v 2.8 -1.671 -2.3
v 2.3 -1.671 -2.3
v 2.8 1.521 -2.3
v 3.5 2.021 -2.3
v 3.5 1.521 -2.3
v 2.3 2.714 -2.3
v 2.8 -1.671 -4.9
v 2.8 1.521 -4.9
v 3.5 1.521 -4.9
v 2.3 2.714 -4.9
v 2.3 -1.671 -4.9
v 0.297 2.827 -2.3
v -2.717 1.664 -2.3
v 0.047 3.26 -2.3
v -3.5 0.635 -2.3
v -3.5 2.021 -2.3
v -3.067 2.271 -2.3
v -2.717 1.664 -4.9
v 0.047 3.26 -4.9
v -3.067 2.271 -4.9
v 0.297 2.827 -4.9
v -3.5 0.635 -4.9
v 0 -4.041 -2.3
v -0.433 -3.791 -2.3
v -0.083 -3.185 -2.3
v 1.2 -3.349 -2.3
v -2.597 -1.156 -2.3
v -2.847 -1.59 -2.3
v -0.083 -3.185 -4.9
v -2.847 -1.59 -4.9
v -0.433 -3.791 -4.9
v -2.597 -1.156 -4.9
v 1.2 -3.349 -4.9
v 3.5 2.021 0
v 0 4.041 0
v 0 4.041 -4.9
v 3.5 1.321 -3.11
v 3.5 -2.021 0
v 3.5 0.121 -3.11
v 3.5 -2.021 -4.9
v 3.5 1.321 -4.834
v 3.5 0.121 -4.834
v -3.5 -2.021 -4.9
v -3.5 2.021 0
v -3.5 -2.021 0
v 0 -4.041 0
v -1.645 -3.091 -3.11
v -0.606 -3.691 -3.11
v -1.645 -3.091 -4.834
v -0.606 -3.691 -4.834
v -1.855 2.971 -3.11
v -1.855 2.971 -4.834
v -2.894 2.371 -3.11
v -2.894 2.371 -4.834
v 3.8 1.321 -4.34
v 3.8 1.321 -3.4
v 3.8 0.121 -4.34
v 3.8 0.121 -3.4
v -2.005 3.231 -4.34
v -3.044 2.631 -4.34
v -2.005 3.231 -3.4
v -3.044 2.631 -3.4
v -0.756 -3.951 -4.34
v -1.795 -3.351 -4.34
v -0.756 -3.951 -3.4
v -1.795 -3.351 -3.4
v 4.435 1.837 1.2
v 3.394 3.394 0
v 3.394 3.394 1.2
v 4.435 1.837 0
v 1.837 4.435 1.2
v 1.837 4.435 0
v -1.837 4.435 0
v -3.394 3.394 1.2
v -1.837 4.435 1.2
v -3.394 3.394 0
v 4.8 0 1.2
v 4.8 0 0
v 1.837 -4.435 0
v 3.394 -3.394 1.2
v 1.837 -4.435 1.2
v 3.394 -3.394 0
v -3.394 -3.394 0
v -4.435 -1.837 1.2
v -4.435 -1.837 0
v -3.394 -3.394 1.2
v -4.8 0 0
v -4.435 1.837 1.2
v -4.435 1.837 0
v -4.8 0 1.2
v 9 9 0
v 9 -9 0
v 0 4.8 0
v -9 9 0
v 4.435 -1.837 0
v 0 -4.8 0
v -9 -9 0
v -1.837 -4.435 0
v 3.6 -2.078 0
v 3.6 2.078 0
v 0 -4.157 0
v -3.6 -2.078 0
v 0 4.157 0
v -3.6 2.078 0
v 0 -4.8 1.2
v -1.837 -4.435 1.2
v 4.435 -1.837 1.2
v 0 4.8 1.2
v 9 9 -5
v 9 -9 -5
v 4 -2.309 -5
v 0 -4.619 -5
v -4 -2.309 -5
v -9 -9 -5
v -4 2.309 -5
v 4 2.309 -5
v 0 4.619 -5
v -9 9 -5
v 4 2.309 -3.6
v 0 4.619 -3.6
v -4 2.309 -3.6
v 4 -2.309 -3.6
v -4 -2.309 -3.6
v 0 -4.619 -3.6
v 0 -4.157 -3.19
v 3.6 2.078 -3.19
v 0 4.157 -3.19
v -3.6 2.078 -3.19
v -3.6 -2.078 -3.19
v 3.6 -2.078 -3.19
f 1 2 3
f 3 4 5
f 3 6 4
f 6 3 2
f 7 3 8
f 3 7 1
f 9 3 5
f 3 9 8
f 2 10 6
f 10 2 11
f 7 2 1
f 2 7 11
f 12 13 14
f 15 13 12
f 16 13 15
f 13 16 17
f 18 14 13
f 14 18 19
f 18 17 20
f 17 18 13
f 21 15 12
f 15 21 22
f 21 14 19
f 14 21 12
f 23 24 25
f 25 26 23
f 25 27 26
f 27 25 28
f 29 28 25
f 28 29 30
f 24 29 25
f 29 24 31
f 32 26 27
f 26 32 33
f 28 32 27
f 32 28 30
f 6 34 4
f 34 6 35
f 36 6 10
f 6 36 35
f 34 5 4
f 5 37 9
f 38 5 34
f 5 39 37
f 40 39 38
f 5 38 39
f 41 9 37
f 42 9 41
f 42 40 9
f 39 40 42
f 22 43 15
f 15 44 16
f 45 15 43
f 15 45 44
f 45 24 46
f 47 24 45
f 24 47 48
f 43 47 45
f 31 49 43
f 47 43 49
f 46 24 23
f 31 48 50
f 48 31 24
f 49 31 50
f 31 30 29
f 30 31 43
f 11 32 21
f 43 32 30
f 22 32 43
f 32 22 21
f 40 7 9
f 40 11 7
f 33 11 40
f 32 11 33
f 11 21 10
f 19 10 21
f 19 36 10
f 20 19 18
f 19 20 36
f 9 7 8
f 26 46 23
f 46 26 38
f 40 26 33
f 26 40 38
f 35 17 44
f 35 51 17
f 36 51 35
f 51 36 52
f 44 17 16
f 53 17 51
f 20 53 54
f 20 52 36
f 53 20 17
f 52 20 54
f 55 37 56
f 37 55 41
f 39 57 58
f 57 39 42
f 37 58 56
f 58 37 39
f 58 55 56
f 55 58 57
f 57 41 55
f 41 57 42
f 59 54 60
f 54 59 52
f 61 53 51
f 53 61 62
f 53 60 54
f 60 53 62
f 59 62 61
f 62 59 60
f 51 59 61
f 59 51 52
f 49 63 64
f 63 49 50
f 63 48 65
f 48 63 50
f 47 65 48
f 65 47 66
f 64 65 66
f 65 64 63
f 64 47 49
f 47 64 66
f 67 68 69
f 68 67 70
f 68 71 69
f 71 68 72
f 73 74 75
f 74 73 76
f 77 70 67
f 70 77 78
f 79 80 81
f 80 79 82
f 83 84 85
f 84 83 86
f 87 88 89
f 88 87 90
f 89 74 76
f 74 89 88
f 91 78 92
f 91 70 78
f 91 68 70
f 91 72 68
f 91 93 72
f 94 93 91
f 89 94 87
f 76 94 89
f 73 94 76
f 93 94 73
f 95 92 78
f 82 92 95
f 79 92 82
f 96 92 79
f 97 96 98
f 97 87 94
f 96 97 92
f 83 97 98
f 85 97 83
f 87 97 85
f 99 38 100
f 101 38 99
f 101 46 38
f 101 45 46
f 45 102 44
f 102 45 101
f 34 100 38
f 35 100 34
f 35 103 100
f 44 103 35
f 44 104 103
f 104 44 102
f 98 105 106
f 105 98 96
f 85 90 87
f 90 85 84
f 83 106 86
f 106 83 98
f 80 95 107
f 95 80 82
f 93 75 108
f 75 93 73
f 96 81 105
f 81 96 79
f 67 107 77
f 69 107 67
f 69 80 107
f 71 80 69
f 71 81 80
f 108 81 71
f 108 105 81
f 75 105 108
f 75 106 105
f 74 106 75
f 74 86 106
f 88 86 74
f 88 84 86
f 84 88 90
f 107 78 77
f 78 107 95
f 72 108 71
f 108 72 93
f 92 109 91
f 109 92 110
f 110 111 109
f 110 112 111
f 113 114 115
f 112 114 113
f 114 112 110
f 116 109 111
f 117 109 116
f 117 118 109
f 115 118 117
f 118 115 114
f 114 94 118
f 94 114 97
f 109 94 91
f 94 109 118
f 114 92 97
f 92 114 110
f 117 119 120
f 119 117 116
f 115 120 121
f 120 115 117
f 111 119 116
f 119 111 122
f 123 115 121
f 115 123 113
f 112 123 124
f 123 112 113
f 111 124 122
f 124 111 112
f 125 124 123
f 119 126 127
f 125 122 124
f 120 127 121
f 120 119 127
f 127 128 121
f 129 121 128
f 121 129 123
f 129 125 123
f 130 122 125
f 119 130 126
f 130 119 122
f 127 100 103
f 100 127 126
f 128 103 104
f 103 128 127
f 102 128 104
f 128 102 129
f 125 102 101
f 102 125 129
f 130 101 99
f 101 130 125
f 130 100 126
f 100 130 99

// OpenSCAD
// file: _review.scad
// Shared by the review protos: the colours of a before/after pair.  The part in a neutral grey-blue, the
// geometry a proposal changes in the accent, the parts it mates with in a translucent grey.
NEUTRAL = "#b9c6d6";
ACCENT = "#ff7a1a";
MATE = "#6f7782";
MATE_A = 0.45;
PCB = "#2f6f4f";
module part() color(NEUTRAL) children();
module changed() color(ACCENT) children();
module mate(a = MATE_A) color(MATE, a) children();
// main file
// Review proto (not a part): a peg's plug (hexgrid.scad peg_plug) in its hole, the plate cut away round it
// (grey, translucent), seen from below.  Today: spring skins 0.7 thick over SKIN_H 2.6, their slot stopping
// 0.35 mm short of the flat's end: a 3.0 mm cantilever, 2.3 % for the nub's 0.2 mm, allowed 1.5 % for
// repeated use.  Proposed (accent: the skins): SKIN_H 3.4, the slot run to the flat's end: 3.7 mm, 1.5 %.
// docs/printed-parts-review.md › Pegs.
//
//   openscad -D 'VIEW="today"' -o peg_skin_today.png mechanical/review/proto/peg_skin.scad
include <_review.scad>
VIEW = "today";
PLATE_T = 5; HEX_AF = 7.2; HEX_U = 0.4; HEX_CLEAR = 0.1; HEX_UNDER_H = 1.4;
PLUG_AF = HEX_AF - 2 * HEX_CLEAR; PLUG_L = PLUG_AF / sqrt(3);
SKIN = 0.7; SKIN_SLOT = 0.5; NUB = 0.3; EPS = 0.01;
function hexpts(af) = [for (k = [0:5]) let (a = 90 + 60 * k) (af / sqrt(3)) * [cos(a), sin(a)]];
module hex2d(af) polygon(hexpts(af));
Z0 = -PLATE_T + 0.1;
ZL = -PLATE_T + HEX_UNDER_H; ZA = ZL + HEX_U + HEX_CLEAR - NUB;

module skin_cuts(skin_h, to_end) for (k = [0, 2, 4]) rotate(60 * k) translate([0, 0, Z0 - 1]) linear_extrude(skin_h + 1) {
    translate([PLUG_AF / 2 - SKIN - SKIN_SLOT, -PLUG_L / 2 + (to_end ? -0.5 : 0.35)]) square([SKIN_SLOT, PLUG_L + (to_end ? 0.5 : 0)]);
    translate([PLUG_AF / 2 - SKIN - SKIN_SLOT, PLUG_L / 2 - SKIN_SLOT]) square([SKIN + SKIN_SLOT + 1, 2]);
}
module nub(k) rotate(60 * k) translate([PLUG_AF / 2, PLUG_L / 2 - SKIN_SLOT - 0.8, 0]) rotate([90, 0, 0]) linear_extrude(1.2, center = true)
    polygon([[-EPS, Z0 + 0.05], [NUB, Z0 + 0.05 + NUB * 1.7], [NUB, ZA], [-EPS, ZA + NUB]]);
module body(skin_h, to_end) difference() { translate([0, 0, Z0]) linear_extrude(PLATE_T - 0.1 + EPS) hex2d(PLUG_AF); skin_cuts(skin_h, to_end); }
module flange() linear_extrude(1.2) circle(d = 9.6);
// a skin: the 0.7 wall left outside the slot, from the slot's start to the cross-slot, over the spring height
module skin_box(k, skin_h, to_end) rotate(60 * k) translate([PLUG_AF / 2 - SKIN, -PLUG_L / 2 + (to_end ? -0.5 : 0.35), Z0 - 0.5]) cube([SKIN + 0.5, PLUG_L - SKIN_SLOT - (to_end ? -0.5 : 0.35), skin_h + 0.5]);
module skin_piece(k, skin_h, to_end) rotate(60 * k) translate([PLUG_AF / 2 - SKIN, -PLUG_L / 2 + (to_end ? -0.5 : 0.35), Z0]) cube([SKIN, PLUG_L - SKIN_SLOT - (to_end ? -0.5 : 0.35), skin_h]);
// the plate round the hole: waist, undercut, 45° ledge (lib/hexgrid.scad hex_hole), 18 mm of plate
module plate_ring() mate(0.35) translate([0, 0, -PLATE_T]) difference() {
    translate([-9, -9, 0]) cube([18, 18, PLATE_T]);
    translate([0, 0, -1]) linear_extrude(HEX_UNDER_H + 1) hex2d(HEX_AF + 2 * HEX_U);
    hull() { translate([0, 0, HEX_UNDER_H - EPS]) linear_extrude(EPS) hex2d(HEX_AF + 2 * HEX_U); translate([0, 0, HEX_UNDER_H + HEX_U]) linear_extrude(EPS) hex2d(HEX_AF); }
    translate([0, 0, HEX_UNDER_H]) linear_extrude(PLATE_T) hex2d(HEX_AF);
}

if (VIEW == "today") { part() { body(2.6, false); for (k = [0, 2, 4]) nub(k); flange(); } plate_ring(); }
else {
    part() { difference() { body(3.4, true); for (k = [0, 2, 4]) skin_box(k, 3.4, true); } flange(); }
    changed() for (k = [0, 2, 4]) { skin_piece(k, 3.4, true); nub(k); }
    plate_ring();
}
